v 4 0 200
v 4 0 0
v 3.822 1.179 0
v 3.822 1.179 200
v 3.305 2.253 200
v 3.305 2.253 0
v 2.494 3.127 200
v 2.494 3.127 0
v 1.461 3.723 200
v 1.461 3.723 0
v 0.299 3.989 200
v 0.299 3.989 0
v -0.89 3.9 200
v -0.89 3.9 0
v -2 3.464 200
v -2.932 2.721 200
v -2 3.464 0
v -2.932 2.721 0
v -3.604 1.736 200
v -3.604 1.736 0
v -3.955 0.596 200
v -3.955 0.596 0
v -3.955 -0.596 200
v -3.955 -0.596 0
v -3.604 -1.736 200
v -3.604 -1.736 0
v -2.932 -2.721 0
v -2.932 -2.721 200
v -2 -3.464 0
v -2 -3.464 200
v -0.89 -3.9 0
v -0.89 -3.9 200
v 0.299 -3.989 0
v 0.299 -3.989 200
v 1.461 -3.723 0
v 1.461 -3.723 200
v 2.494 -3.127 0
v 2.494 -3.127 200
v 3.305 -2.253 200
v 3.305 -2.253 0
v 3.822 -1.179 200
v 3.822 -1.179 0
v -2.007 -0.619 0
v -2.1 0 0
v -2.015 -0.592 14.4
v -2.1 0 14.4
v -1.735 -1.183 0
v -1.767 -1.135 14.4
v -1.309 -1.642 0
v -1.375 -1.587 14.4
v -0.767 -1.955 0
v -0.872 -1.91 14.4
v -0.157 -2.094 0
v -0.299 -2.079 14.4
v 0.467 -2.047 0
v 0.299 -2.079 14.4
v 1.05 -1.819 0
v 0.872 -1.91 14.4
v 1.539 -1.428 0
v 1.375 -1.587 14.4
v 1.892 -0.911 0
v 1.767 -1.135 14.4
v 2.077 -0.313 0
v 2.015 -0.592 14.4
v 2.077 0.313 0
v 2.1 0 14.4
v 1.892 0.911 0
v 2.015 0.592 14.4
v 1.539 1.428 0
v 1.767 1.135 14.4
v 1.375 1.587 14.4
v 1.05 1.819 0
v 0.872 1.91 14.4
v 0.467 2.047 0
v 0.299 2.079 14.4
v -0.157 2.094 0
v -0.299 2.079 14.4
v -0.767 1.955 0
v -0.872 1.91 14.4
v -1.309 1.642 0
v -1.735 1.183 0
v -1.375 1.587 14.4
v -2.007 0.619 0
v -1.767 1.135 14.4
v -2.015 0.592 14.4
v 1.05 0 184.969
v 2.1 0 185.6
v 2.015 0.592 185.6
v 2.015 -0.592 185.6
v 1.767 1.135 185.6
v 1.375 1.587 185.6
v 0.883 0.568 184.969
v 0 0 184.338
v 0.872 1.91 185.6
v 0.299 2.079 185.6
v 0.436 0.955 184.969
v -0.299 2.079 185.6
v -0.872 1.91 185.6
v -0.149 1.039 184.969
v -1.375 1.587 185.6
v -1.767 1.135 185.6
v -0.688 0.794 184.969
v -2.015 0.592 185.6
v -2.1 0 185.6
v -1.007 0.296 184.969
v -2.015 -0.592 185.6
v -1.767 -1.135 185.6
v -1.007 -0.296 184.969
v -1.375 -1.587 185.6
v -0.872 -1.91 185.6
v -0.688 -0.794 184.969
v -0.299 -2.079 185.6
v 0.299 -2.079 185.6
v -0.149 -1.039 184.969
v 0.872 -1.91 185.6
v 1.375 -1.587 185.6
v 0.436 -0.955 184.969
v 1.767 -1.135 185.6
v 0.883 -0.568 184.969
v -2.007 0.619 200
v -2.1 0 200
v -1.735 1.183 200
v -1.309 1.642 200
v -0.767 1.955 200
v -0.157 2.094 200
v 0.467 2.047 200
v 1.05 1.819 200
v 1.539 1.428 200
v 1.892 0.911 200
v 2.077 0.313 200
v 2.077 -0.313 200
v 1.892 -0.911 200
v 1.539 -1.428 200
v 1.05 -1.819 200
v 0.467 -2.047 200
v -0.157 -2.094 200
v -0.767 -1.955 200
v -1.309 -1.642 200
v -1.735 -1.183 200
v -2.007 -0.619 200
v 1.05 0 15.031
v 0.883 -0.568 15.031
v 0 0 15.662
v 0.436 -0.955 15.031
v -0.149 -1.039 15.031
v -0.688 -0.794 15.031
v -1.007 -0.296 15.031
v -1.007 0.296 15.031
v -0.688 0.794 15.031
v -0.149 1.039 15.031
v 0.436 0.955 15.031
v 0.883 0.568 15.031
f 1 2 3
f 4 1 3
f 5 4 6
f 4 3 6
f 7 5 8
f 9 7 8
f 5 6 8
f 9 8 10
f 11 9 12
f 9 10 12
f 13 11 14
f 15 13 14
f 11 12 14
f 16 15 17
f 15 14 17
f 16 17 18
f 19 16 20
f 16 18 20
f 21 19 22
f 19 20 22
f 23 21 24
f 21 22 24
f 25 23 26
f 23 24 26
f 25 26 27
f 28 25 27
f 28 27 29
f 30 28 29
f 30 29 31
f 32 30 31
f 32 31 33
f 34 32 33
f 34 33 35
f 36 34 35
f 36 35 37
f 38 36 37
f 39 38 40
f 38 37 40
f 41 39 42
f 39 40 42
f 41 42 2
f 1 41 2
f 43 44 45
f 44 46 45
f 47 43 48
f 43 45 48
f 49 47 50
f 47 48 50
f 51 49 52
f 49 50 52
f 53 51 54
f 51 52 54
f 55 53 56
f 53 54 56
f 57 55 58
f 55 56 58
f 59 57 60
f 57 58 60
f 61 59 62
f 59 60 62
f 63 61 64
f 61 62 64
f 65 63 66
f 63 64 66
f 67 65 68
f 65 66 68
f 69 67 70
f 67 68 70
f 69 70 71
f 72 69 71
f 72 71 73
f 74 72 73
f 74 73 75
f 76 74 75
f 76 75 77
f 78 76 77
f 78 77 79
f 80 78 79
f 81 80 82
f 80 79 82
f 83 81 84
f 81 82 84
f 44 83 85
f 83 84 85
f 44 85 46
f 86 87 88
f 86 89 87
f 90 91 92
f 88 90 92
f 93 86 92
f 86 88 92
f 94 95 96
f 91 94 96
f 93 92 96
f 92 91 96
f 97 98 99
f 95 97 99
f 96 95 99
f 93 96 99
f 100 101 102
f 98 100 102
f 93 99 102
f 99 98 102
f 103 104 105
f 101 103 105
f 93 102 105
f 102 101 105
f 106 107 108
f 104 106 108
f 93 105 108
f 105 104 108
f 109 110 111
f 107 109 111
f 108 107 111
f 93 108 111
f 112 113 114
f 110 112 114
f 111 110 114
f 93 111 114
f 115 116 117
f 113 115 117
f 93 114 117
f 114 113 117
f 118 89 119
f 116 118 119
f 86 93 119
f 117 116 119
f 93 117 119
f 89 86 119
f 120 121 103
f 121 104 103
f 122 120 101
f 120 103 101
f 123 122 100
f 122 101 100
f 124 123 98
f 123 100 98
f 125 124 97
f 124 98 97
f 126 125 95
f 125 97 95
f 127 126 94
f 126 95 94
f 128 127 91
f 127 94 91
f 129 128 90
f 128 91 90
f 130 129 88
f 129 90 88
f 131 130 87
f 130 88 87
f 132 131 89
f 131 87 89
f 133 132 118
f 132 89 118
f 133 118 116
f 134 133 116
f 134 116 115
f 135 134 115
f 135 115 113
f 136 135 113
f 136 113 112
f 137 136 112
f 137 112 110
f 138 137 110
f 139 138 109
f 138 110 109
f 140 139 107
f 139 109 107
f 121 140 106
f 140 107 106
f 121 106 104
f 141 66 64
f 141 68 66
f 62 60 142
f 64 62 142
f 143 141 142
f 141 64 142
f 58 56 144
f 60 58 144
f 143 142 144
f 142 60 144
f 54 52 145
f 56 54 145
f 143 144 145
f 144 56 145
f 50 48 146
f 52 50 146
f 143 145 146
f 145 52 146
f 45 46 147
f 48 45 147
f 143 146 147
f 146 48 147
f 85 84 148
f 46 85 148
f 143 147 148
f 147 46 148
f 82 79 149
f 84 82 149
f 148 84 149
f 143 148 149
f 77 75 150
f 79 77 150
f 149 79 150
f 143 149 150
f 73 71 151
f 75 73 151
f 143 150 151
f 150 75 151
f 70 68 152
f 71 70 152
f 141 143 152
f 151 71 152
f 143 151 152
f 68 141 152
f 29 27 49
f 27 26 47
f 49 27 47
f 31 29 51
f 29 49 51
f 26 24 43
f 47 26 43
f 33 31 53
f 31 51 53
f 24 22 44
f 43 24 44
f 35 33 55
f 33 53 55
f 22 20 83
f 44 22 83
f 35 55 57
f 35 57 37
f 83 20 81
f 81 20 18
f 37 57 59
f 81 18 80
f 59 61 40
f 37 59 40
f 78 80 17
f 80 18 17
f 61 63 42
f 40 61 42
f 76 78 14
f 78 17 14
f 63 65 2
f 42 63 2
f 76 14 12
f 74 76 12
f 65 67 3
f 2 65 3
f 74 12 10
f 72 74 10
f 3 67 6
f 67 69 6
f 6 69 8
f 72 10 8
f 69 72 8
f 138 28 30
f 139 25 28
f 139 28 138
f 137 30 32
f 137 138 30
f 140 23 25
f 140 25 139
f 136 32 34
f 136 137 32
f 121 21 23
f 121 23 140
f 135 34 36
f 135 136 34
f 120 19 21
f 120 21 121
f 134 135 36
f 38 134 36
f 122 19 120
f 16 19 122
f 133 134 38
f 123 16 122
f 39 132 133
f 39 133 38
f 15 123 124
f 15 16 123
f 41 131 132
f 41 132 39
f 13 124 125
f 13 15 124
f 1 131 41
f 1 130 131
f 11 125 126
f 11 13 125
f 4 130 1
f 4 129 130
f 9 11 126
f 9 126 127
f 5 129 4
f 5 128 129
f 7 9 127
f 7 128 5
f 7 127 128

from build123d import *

# Parameters (mm, degrees)
F0_R     = 4
F1_DEPTH = 200
F3_D     = 4.2
F3_DEPTH = 14.4
F3_TIP   = 1.2618073
F5_D     = 4.2
F5_DEPTH = 14.4
F5_TIP   = 1.2618073


with BuildPart() as f1:
    # F0 (on Top) → F1 (new body)
    with BuildSketch(Plane.XY):
        Circle(F0_R)
    extrude(amount=F1_DEPTH)

    # F3
    with Locations(Plane.XY.offset(200)):
        with Locations((0, 0)):
            Hole(F3_D / 2, depth=F3_DEPTH)
            with Locations((0, 0, -(F3_DEPTH + F3_TIP / 2))):  # 118° drill point
                Cone(0, F3_D / 2, F3_TIP, mode=Mode.SUBTRACT)

    # F5
    with Locations(Plane(origin=(0, 0, 0), x_dir=(1, 0, 0), z_dir=(0, 0, -1))):
        with Locations((0, 0)):
            Hole(F5_D / 2, depth=F5_DEPTH)
            with Locations((0, 0, -(F5_DEPTH + F5_TIP / 2))):  # 118° drill point
                Cone(0, F5_D / 2, F5_TIP, mode=Mode.SUBTRACT)


solid = f1.part
